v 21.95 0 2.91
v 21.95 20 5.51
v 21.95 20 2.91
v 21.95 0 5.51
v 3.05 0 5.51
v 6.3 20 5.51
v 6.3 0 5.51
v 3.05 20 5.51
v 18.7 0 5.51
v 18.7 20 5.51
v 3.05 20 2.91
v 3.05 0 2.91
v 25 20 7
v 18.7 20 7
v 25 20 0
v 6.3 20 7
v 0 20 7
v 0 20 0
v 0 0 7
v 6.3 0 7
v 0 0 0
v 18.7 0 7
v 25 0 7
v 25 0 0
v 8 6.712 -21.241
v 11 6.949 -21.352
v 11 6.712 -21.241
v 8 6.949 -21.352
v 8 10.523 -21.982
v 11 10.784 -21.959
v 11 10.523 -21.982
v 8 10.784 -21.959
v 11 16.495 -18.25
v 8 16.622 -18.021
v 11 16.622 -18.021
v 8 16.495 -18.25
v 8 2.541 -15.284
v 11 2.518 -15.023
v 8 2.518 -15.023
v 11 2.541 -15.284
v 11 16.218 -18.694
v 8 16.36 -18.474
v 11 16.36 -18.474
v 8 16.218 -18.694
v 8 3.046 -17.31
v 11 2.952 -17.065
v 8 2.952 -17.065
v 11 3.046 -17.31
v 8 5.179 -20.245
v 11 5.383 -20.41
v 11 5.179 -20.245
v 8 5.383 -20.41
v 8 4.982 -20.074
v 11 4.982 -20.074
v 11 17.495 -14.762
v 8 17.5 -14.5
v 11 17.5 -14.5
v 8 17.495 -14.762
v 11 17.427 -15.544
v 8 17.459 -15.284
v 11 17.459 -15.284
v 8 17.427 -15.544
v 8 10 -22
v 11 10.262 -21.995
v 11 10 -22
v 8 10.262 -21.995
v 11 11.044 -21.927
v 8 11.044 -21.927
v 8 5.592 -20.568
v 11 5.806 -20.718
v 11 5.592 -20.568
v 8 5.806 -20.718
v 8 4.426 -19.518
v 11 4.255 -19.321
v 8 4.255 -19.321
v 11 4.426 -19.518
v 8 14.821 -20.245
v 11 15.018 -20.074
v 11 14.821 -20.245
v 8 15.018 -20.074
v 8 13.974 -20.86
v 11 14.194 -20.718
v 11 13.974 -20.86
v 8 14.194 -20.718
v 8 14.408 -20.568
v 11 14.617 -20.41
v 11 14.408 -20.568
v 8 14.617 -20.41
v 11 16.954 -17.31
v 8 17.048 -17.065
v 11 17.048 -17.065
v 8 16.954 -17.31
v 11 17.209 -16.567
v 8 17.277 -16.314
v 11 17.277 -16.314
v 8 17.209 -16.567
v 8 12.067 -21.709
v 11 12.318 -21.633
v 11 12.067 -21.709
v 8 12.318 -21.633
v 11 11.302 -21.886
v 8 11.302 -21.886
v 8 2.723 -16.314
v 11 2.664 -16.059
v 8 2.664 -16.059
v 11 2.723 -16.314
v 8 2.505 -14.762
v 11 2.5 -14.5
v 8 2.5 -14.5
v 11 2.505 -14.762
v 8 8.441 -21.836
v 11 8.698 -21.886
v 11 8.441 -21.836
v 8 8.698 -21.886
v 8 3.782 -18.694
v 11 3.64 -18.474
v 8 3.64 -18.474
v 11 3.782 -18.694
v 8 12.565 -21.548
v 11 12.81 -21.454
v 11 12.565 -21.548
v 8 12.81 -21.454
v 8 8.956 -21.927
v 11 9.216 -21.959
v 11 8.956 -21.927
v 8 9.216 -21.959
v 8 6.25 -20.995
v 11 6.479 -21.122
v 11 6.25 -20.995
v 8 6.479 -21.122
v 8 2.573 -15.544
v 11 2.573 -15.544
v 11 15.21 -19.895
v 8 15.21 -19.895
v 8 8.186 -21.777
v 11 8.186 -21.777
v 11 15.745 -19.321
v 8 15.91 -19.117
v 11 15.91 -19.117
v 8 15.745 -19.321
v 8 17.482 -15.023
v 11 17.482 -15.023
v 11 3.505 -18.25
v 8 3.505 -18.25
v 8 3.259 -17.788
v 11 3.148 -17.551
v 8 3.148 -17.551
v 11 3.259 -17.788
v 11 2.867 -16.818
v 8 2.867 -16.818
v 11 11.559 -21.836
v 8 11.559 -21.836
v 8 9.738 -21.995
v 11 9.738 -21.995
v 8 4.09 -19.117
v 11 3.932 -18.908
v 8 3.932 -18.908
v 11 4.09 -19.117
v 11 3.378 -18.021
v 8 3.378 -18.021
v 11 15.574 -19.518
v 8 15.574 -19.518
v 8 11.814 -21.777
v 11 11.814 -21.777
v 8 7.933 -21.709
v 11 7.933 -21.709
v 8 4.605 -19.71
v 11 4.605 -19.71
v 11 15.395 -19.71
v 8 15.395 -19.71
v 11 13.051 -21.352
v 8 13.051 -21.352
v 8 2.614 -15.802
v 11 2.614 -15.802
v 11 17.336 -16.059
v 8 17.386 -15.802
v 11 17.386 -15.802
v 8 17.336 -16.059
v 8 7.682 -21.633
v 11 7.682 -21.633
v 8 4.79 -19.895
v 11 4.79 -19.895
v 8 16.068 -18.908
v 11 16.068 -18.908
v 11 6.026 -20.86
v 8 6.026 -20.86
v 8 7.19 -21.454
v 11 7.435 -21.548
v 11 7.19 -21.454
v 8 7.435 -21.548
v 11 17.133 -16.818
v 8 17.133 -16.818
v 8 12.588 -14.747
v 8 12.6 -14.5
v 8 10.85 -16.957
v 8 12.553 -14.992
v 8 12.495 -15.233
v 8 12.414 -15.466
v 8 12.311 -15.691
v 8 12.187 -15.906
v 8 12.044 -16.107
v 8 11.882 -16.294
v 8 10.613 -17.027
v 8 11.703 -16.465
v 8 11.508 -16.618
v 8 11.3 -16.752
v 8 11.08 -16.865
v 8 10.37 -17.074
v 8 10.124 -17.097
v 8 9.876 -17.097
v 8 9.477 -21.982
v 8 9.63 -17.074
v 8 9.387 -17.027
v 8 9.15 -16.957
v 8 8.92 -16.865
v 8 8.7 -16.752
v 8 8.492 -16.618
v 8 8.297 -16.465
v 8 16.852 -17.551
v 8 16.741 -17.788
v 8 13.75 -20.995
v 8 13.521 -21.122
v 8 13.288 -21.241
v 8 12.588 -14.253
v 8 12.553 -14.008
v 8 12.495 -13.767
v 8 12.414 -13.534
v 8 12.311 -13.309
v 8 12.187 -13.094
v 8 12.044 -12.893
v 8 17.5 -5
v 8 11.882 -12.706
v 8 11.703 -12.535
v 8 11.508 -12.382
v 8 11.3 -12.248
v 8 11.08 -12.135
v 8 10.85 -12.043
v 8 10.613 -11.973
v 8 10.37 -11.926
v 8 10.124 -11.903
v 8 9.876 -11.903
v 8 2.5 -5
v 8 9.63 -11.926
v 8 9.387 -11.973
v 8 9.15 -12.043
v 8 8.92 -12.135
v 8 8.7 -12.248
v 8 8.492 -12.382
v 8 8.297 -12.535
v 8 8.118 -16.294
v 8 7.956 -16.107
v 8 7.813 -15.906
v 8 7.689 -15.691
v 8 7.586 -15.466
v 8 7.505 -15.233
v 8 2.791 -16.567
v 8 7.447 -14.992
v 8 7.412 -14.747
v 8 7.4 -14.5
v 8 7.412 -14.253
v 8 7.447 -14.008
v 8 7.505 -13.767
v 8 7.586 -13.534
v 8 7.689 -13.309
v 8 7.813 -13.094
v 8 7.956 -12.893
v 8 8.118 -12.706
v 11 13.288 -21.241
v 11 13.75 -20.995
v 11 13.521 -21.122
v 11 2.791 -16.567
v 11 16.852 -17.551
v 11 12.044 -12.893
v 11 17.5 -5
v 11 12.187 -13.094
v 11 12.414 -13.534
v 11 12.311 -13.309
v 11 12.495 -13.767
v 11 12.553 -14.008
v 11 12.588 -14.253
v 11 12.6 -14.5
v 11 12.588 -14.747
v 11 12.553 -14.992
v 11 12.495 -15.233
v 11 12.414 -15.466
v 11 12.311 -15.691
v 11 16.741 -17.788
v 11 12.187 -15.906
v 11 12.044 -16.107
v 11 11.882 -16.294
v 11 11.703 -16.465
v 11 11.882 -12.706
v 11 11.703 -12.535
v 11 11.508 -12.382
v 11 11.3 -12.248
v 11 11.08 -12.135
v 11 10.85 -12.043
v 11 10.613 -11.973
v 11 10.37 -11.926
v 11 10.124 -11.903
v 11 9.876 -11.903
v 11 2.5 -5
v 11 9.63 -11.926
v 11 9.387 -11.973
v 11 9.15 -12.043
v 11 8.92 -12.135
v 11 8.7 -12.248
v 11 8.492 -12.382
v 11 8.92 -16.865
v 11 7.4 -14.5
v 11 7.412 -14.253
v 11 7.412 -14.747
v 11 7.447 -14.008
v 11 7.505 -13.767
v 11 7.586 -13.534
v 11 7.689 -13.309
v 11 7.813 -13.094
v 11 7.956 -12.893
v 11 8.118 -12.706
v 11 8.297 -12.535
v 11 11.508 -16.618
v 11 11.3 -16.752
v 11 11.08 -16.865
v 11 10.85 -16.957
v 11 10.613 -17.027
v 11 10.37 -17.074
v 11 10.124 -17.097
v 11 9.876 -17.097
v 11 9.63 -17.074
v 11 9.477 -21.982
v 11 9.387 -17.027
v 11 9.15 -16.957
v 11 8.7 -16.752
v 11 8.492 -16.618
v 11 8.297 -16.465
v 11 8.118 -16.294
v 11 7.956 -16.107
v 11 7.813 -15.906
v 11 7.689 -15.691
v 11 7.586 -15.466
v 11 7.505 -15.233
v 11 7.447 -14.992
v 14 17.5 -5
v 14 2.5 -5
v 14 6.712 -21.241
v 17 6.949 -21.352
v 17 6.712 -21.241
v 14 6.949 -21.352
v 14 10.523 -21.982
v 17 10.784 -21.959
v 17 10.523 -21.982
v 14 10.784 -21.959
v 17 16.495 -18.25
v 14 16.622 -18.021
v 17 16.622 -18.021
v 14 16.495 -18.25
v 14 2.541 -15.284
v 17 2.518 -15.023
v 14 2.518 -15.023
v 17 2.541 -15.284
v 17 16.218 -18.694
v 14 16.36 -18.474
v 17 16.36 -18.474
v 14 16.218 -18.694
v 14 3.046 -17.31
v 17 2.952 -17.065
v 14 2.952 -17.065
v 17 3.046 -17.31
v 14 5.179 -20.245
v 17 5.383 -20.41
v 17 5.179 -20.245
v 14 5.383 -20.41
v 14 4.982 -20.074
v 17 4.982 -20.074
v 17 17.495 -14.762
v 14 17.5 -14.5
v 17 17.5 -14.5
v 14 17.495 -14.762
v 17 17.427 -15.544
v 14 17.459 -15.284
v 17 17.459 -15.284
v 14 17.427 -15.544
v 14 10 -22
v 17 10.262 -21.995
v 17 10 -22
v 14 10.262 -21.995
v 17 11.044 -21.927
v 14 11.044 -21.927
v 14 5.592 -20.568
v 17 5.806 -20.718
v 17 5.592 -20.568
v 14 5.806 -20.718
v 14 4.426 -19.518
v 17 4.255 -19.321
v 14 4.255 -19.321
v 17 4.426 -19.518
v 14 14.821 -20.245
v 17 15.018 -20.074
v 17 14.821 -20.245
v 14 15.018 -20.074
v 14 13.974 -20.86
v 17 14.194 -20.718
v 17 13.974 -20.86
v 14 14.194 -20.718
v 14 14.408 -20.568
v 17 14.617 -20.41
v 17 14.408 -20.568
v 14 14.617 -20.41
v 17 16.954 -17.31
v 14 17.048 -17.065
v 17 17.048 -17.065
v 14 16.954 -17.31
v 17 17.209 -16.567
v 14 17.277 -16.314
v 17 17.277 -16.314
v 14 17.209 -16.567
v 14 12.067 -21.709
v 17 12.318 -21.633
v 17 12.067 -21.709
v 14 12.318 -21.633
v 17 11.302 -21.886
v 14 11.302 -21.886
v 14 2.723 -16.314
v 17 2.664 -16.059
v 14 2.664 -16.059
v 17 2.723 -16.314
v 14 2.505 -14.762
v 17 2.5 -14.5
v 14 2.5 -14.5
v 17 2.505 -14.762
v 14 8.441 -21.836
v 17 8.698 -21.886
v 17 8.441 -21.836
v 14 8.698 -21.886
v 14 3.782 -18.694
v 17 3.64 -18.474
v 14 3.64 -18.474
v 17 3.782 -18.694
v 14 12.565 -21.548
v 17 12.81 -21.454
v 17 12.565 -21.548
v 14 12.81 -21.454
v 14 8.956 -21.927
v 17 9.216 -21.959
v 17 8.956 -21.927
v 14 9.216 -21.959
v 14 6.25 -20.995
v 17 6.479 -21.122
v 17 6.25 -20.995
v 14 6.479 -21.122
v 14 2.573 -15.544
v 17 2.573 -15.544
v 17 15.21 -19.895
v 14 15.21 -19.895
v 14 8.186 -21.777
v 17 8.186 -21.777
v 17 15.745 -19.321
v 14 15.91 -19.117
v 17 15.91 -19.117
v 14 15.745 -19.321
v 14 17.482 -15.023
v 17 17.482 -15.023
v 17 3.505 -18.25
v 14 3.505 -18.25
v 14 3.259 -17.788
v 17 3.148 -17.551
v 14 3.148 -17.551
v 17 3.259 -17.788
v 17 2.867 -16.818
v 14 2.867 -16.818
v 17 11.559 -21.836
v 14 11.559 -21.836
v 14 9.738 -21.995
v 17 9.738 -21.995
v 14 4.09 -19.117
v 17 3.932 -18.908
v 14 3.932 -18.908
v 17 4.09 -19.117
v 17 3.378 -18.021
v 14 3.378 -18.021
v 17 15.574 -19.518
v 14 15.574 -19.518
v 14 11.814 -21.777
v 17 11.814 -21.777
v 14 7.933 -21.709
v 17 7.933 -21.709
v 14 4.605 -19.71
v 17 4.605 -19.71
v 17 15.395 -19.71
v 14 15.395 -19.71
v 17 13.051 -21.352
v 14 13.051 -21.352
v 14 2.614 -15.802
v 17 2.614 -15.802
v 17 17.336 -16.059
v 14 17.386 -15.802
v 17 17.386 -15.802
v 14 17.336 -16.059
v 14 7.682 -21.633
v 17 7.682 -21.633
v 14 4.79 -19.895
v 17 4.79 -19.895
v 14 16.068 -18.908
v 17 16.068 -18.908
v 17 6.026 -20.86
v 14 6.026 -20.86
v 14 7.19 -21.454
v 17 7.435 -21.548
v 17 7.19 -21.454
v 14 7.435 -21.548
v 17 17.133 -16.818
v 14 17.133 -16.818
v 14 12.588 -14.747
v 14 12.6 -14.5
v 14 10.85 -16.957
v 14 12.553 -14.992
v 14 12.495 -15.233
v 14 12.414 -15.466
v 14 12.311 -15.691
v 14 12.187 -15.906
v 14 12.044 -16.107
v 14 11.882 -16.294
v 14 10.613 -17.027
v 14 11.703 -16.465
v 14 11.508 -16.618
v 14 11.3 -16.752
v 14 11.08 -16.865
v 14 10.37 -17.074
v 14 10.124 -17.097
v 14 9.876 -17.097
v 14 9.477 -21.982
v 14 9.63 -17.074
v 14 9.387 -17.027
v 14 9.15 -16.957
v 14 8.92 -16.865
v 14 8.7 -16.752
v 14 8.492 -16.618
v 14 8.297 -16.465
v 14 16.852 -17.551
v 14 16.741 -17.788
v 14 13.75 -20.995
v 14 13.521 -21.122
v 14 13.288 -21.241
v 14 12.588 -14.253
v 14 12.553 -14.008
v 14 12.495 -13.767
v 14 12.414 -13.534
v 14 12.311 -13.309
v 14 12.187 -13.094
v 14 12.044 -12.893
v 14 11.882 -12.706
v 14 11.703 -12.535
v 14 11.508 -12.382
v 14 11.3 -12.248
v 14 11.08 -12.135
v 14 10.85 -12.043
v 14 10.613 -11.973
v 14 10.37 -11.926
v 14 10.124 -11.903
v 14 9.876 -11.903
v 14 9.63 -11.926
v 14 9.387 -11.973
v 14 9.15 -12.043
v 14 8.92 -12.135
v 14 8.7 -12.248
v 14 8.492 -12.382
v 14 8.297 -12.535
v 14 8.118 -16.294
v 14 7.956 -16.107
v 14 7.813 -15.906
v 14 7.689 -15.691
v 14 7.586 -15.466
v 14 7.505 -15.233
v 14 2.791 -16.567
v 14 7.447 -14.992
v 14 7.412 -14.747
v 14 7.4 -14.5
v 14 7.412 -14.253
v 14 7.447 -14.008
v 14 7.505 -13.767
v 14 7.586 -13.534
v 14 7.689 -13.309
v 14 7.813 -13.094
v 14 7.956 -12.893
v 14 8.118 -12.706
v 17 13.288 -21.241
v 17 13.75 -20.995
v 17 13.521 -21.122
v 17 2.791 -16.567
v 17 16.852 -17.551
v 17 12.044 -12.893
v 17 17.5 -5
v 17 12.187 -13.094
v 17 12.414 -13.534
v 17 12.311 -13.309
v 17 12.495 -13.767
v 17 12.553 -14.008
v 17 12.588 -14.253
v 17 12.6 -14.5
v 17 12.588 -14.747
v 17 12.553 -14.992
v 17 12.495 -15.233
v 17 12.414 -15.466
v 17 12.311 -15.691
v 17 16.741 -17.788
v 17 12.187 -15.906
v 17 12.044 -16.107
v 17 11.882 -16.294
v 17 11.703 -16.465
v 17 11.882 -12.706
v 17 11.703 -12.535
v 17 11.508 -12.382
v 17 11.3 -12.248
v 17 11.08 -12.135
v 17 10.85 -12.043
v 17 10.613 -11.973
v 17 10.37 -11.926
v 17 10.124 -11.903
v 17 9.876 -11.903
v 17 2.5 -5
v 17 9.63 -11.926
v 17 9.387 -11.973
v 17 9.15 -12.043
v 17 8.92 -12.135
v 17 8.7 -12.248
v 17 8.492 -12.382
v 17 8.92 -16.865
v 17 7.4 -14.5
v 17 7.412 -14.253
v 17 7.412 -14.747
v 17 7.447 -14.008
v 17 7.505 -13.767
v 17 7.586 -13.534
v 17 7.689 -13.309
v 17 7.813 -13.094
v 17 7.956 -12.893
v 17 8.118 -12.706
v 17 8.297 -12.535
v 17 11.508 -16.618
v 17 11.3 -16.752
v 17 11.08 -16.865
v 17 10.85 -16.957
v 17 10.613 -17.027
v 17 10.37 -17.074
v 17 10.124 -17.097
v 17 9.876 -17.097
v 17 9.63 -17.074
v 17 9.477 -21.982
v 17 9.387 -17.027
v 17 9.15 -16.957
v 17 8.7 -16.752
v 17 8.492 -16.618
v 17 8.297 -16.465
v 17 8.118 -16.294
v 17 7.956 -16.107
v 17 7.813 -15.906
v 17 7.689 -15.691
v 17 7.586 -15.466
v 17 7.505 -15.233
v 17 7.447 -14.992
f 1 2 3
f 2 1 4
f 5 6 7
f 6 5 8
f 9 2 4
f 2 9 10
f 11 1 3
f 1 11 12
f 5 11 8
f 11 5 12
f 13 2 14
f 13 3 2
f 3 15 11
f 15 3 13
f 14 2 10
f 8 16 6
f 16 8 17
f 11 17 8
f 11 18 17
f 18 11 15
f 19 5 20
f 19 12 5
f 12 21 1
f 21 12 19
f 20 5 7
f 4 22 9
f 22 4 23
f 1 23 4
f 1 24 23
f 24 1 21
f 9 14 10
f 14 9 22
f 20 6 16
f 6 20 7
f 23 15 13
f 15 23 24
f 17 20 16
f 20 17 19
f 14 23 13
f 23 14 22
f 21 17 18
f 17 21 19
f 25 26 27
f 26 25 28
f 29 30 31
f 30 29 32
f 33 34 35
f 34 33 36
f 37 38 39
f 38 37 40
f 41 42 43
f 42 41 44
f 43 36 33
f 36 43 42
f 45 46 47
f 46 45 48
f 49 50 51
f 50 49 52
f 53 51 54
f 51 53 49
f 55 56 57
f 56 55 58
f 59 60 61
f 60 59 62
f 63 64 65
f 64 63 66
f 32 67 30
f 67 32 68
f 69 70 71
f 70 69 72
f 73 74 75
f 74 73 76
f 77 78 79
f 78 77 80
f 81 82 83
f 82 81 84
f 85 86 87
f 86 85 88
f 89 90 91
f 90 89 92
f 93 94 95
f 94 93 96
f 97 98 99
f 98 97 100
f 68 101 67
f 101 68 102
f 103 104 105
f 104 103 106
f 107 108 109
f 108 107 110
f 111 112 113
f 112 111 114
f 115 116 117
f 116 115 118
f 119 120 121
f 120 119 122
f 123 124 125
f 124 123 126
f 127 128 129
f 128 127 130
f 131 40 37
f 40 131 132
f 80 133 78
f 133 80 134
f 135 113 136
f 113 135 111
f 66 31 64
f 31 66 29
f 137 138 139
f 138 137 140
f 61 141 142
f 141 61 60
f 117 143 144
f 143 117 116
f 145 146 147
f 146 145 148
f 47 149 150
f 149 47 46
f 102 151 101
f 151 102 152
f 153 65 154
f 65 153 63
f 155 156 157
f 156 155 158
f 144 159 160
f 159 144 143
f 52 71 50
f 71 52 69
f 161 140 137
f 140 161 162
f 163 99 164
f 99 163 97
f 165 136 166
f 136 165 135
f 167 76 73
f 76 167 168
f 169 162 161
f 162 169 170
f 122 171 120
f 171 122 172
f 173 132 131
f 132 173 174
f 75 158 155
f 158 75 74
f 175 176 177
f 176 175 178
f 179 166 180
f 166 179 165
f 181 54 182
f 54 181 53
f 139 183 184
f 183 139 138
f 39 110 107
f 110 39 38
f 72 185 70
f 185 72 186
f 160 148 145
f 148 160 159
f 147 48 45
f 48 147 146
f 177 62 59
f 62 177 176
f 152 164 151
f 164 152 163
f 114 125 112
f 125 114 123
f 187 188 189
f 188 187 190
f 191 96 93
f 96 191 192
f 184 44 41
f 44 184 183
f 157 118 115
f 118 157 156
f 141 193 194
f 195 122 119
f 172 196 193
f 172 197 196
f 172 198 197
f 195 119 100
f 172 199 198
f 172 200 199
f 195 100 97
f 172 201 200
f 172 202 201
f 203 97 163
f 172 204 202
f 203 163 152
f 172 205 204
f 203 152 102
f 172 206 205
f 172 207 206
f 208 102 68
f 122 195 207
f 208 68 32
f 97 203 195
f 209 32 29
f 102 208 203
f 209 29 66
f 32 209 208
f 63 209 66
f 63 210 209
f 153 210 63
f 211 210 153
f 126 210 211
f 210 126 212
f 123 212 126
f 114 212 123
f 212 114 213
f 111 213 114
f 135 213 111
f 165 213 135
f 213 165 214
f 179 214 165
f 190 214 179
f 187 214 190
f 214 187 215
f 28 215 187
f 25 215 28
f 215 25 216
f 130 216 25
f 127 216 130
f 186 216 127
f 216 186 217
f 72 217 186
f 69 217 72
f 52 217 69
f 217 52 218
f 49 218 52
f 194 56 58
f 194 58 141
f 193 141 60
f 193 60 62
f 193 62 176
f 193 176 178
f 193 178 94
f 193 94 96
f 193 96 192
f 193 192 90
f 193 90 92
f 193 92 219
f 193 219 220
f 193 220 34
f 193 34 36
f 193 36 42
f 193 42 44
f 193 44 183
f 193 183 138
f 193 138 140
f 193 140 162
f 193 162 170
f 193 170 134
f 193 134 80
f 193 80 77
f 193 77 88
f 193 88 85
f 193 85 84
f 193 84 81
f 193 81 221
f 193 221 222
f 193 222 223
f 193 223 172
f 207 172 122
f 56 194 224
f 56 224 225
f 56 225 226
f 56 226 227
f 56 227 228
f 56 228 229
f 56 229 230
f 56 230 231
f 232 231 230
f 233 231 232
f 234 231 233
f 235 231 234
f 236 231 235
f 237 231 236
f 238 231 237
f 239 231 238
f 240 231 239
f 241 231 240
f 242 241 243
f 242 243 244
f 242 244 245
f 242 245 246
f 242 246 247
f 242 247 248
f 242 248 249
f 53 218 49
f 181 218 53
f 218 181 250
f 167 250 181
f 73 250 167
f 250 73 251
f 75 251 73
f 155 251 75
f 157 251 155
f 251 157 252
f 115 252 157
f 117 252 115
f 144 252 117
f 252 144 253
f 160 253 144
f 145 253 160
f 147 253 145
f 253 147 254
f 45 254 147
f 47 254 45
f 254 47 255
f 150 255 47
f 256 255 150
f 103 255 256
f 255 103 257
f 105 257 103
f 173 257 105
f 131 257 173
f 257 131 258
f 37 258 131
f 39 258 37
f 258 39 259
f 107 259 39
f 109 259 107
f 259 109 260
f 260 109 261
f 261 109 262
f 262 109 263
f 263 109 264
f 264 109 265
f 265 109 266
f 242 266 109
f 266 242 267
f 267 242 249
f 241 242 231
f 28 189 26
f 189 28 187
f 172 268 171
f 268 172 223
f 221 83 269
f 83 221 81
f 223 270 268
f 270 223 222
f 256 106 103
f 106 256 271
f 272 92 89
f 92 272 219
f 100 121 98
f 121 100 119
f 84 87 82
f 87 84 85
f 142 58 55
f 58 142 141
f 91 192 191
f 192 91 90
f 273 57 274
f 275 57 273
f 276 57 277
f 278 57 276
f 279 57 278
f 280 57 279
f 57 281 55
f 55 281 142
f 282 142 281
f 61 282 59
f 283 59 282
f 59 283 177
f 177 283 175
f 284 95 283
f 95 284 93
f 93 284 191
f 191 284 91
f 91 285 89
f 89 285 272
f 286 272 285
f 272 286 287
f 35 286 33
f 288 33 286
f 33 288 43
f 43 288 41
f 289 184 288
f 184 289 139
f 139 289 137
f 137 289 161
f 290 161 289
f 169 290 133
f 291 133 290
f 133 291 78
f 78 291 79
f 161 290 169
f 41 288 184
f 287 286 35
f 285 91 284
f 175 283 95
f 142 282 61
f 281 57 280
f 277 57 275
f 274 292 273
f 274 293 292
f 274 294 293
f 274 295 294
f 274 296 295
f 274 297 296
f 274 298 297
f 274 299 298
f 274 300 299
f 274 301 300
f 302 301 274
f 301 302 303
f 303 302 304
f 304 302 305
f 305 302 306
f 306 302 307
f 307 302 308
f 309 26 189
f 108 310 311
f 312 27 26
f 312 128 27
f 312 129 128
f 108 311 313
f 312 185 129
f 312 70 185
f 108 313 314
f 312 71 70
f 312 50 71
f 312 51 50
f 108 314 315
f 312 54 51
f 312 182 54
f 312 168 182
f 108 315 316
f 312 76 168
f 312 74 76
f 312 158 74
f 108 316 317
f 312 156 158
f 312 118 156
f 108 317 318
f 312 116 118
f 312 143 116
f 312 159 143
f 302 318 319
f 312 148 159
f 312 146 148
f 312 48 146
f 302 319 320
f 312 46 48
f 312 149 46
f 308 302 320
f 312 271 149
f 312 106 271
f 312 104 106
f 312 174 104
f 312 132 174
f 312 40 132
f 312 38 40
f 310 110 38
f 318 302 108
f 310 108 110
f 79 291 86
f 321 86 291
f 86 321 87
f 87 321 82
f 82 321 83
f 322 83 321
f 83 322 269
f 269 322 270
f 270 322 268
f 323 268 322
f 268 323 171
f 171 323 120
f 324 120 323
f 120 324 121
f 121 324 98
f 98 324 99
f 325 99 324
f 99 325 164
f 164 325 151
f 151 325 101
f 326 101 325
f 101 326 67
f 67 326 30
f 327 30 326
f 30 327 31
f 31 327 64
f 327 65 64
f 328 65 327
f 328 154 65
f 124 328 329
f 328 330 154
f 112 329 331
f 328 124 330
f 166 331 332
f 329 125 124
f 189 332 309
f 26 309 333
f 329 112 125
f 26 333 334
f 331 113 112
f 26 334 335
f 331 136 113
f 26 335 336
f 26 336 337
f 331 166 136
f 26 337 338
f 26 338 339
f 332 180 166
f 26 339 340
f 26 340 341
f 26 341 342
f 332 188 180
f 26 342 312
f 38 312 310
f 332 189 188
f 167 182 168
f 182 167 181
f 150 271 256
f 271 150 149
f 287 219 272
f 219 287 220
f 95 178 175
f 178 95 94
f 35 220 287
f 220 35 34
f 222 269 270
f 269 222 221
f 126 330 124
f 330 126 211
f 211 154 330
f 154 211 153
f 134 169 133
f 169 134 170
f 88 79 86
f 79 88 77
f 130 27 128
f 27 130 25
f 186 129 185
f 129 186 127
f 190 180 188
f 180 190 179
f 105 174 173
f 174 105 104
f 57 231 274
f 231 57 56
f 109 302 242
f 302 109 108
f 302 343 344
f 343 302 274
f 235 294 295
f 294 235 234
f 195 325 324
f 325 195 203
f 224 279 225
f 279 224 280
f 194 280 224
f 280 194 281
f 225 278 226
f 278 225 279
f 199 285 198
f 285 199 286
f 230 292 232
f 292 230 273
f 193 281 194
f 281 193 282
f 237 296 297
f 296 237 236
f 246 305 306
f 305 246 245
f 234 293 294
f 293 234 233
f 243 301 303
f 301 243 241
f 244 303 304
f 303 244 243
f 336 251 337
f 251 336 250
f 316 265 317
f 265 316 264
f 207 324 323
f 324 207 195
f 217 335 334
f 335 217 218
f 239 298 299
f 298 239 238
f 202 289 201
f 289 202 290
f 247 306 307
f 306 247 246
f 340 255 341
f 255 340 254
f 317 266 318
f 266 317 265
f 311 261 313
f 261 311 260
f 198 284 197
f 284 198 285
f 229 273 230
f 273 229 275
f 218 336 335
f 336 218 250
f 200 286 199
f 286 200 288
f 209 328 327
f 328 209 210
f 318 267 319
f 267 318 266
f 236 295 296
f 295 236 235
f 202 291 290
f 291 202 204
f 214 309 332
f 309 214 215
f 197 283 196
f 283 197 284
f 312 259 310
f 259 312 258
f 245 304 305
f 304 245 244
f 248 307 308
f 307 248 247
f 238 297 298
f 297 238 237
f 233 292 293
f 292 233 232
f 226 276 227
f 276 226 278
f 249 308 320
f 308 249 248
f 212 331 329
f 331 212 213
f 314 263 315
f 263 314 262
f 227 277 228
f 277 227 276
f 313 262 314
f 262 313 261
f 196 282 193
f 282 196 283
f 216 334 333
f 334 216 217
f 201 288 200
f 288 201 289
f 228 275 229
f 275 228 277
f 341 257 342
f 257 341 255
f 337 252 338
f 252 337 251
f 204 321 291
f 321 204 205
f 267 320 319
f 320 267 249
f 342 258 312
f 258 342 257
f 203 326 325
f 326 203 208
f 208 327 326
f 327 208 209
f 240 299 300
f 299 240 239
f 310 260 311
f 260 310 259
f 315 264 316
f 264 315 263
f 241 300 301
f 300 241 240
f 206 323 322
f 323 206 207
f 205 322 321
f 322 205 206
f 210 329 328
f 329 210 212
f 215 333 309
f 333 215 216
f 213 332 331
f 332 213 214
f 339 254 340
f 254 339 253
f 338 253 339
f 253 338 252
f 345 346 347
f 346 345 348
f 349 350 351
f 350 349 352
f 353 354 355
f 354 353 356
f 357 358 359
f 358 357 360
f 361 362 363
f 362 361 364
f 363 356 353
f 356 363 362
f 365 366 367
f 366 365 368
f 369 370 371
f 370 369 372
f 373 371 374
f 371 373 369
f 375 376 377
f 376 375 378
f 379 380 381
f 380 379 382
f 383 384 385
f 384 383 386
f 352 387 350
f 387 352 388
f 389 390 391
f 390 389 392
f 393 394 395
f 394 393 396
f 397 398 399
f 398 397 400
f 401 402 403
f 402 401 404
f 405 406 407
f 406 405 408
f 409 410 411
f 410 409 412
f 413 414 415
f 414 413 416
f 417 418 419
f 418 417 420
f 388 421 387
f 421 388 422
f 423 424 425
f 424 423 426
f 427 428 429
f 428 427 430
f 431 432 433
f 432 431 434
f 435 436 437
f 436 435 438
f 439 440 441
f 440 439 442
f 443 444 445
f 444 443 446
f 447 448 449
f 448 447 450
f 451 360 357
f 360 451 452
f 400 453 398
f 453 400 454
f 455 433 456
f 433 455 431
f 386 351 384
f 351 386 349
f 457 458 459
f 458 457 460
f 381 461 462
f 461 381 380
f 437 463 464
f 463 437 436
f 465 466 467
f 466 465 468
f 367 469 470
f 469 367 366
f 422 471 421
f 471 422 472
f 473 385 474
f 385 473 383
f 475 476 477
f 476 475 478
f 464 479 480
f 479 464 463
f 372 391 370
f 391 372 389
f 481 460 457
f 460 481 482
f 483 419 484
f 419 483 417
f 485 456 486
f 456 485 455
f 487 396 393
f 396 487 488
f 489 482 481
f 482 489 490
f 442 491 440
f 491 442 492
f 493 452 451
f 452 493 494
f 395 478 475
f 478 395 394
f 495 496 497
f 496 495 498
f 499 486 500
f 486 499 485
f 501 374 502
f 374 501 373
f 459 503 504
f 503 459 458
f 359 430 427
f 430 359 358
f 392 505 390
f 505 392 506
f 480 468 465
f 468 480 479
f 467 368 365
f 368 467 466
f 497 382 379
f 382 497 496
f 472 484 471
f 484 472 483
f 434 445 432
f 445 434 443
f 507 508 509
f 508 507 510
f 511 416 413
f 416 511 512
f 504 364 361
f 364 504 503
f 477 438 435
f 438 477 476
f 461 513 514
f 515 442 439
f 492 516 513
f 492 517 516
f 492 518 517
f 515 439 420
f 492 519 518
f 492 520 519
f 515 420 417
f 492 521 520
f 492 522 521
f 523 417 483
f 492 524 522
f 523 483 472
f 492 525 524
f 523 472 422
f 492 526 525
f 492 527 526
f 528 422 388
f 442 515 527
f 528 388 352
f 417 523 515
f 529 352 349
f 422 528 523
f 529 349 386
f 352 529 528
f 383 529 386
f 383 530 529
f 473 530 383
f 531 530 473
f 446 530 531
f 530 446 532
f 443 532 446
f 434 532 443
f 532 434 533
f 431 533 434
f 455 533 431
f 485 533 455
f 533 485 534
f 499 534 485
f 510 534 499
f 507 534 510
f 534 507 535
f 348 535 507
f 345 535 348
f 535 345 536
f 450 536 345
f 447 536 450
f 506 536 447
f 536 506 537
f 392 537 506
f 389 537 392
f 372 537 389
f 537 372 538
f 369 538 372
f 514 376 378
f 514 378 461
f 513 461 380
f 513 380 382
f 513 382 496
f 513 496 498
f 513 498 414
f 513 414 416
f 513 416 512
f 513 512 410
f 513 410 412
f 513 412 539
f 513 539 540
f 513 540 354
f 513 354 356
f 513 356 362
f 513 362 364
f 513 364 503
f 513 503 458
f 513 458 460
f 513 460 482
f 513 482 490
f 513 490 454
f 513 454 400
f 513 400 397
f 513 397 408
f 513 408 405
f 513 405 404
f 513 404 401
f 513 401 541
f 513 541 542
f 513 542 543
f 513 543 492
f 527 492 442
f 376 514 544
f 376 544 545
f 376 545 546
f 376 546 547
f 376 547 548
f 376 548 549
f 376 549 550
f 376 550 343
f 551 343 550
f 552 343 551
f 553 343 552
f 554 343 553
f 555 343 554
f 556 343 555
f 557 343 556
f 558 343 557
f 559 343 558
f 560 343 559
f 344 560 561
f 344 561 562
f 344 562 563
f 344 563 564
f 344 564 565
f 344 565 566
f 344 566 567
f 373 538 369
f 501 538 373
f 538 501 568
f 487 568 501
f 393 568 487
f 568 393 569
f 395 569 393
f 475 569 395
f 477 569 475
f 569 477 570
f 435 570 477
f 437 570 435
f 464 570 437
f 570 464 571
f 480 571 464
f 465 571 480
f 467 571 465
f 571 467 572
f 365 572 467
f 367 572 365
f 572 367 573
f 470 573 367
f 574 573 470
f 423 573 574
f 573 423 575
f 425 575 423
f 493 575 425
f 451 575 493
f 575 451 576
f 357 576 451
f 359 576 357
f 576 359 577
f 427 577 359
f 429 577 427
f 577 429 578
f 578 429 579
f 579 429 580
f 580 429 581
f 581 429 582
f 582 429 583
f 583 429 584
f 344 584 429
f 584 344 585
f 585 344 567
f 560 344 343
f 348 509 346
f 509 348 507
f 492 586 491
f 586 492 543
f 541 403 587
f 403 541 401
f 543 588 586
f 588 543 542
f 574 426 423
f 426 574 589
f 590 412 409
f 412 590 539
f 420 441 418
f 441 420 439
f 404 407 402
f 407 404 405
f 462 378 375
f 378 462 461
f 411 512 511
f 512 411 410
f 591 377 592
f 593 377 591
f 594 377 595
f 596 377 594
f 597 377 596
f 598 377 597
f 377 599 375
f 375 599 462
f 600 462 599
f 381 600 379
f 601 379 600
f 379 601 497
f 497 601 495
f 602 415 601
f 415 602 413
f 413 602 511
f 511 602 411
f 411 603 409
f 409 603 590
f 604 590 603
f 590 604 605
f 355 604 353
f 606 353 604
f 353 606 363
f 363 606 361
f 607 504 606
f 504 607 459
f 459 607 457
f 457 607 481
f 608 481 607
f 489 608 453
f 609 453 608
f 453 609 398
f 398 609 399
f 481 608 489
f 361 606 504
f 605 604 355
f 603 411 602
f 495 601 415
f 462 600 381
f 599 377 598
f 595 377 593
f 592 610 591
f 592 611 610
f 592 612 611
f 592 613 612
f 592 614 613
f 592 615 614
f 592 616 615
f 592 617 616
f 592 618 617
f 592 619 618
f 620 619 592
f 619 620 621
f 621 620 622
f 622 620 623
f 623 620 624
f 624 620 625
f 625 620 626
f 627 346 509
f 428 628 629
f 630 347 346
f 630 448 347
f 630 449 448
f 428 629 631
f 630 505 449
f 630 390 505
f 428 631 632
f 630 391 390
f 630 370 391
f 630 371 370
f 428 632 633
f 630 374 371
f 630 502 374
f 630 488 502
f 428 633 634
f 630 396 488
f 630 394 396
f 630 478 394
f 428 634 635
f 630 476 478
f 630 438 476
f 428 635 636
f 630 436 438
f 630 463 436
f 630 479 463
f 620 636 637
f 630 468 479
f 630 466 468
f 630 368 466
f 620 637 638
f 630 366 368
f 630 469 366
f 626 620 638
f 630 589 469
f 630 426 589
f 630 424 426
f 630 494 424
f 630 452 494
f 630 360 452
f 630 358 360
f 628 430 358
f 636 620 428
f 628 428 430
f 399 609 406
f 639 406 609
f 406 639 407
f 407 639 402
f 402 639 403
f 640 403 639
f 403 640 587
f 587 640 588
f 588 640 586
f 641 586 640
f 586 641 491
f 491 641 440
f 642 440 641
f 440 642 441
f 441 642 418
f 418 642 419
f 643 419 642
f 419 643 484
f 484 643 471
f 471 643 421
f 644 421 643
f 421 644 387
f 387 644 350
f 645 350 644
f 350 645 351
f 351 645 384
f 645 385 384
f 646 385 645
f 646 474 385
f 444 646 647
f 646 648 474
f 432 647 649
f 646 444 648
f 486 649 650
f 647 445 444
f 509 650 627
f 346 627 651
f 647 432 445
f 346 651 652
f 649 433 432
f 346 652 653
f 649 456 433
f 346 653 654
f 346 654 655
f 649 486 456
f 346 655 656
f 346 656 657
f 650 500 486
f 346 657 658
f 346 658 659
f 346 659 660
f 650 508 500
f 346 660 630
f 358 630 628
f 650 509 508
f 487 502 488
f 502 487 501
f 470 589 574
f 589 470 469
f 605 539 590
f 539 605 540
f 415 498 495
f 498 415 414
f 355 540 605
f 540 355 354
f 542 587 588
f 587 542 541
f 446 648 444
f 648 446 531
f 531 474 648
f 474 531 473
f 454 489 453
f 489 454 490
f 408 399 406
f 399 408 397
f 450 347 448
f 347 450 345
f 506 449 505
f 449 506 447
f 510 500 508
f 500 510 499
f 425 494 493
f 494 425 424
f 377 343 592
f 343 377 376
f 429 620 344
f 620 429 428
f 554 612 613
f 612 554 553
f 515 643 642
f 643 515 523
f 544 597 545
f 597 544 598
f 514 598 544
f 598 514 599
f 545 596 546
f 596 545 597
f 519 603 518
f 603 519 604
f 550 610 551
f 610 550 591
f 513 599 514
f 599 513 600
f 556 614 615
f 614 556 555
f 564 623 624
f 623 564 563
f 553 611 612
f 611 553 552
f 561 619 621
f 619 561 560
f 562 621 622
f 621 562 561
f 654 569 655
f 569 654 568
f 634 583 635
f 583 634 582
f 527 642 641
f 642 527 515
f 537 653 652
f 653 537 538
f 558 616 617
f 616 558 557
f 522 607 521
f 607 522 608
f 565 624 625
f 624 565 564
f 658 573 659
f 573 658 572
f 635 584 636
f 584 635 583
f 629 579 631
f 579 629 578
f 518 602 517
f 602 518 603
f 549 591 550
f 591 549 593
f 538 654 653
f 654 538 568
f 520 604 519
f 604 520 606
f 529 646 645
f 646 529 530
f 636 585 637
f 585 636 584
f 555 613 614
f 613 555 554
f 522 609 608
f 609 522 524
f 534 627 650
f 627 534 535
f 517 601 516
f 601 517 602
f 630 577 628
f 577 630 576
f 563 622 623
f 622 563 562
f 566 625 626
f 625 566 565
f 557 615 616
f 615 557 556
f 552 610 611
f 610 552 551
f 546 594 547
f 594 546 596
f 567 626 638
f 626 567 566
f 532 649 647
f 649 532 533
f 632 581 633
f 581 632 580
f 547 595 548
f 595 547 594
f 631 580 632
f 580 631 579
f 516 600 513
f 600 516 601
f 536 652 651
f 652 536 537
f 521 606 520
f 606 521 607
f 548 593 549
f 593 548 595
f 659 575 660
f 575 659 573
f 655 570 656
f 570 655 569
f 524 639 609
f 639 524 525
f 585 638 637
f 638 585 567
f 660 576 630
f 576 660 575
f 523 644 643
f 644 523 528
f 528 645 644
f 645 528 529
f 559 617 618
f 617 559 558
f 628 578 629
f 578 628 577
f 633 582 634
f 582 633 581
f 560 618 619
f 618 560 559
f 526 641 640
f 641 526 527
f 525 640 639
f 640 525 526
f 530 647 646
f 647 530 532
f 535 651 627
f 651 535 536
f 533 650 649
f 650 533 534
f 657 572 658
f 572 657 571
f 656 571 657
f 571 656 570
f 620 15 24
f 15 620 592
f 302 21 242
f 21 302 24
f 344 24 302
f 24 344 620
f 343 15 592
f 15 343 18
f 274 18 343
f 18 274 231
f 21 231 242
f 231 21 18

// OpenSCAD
// file: gopro-mount-library.scad
$fa = 2;
$fs = 0.25;
gopro_extra_mount_depth = 3;
gopro_flap_width = 3;
gopro_flap_with_nut_width = gopro_flap_width + 5;
gopro_flap_depth = 15;
gopro_flap_extra_depth = 2;
gopro_flap_spacing = 3;
gopro_screw_dia = 5.2;

gopro_tripod_width = gopro_flap_with_nut_width + 2 * gopro_flap_width + 2 * gopro_flap_spacing;
gopro_camera_width = 2 * gopro_flap_width + gopro_flap_spacing;

// derived values

gfdh = gopro_flap_depth/2;
nh = gopro_flap_with_nut_width - gopro_flap_width;



module gopro_nut_hole() {
    for(i = [0, 120, 240]) {
        rotate([0, 0, i])
            cube([4.6765, 8.1, nh], center = true);
    } 
}

module gopro_flap(width = gopro_flap_width) {
    difference() {
        union() {
            cylinder(d = gopro_flap_depth, h = width);
            translate([-gfdh, 0, 0])
                cube([gopro_flap_depth, gopro_flap_depth - gfdh + gopro_flap_extra_depth, width]);
        }
        translate([0, 0, -0.01])
            cylinder(d = gopro_screw_dia, h = width + 0.02);
    } 
}

module gopro_mount_camera_side() {
    translate([0, - gfdh - gopro_flap_extra_depth, 0]) {
        
        gopro_flap();
        translate([0, 0, gopro_flap_width + gopro_flap_spacing])
            gopro_flap();
    }
}

module gopro_mount_tripod_side() {
    translate([0, - gfdh - gopro_flap_extra_depth, 0]) {
        difference() {
            gopro_flap(gopro_flap_with_nut_width);
            translate([0, 0, nh/2 - 0.01])
                gopro_nut_hole();
        }
    }
    translate([0, 0, gopro_flap_with_nut_width + gopro_flap_spacing])
        gopro_mount_camera_side();    
}
// main file
include <gopro-mount-library.scad>

shoe_x = 25;
shoe_y = 20;
shoe_z = 7;

module cold_shoe_nut_trap(head_width, h ) {
    cylinder(r = w / 2 / cos(180 / 6) + 0.05, h=h, $fn=6);
    
}

module cold_shoe_cutout(y = shoe_y) {
    cube([18.9, y, 2.6]);
    translate([(18.9-12.4)/2, 0, 2.6])
        cube([12.4, y, 1.5]);
}

module cold_shoe() {
    difference() {
        cube([shoe_x, shoe_y, shoe_z]);
        translate([(shoe_x-18.9)/2, 0, shoe_z - 1.5 - 2.6 + 0.01])
            cold_shoe_cutout();
    }
}

module gopro_cold_shoe() {
    cold_shoe();
    hull() {
        cube([shoe_x, shoe_y, 0.01]);
        translate([(shoe_x - gopro_camera_width)/2, (shoe_y - gopro_flap_depth)/2, -5])
            cube([gopro_camera_width, gopro_flap_depth, 5]);
    }
    translate([(shoe_x - gopro_camera_width)/2, shoe_y/2, -5])
        rotate([90, 0, 90])
            gopro_mount_camera_side();
}

gopro_cold_shoe();
